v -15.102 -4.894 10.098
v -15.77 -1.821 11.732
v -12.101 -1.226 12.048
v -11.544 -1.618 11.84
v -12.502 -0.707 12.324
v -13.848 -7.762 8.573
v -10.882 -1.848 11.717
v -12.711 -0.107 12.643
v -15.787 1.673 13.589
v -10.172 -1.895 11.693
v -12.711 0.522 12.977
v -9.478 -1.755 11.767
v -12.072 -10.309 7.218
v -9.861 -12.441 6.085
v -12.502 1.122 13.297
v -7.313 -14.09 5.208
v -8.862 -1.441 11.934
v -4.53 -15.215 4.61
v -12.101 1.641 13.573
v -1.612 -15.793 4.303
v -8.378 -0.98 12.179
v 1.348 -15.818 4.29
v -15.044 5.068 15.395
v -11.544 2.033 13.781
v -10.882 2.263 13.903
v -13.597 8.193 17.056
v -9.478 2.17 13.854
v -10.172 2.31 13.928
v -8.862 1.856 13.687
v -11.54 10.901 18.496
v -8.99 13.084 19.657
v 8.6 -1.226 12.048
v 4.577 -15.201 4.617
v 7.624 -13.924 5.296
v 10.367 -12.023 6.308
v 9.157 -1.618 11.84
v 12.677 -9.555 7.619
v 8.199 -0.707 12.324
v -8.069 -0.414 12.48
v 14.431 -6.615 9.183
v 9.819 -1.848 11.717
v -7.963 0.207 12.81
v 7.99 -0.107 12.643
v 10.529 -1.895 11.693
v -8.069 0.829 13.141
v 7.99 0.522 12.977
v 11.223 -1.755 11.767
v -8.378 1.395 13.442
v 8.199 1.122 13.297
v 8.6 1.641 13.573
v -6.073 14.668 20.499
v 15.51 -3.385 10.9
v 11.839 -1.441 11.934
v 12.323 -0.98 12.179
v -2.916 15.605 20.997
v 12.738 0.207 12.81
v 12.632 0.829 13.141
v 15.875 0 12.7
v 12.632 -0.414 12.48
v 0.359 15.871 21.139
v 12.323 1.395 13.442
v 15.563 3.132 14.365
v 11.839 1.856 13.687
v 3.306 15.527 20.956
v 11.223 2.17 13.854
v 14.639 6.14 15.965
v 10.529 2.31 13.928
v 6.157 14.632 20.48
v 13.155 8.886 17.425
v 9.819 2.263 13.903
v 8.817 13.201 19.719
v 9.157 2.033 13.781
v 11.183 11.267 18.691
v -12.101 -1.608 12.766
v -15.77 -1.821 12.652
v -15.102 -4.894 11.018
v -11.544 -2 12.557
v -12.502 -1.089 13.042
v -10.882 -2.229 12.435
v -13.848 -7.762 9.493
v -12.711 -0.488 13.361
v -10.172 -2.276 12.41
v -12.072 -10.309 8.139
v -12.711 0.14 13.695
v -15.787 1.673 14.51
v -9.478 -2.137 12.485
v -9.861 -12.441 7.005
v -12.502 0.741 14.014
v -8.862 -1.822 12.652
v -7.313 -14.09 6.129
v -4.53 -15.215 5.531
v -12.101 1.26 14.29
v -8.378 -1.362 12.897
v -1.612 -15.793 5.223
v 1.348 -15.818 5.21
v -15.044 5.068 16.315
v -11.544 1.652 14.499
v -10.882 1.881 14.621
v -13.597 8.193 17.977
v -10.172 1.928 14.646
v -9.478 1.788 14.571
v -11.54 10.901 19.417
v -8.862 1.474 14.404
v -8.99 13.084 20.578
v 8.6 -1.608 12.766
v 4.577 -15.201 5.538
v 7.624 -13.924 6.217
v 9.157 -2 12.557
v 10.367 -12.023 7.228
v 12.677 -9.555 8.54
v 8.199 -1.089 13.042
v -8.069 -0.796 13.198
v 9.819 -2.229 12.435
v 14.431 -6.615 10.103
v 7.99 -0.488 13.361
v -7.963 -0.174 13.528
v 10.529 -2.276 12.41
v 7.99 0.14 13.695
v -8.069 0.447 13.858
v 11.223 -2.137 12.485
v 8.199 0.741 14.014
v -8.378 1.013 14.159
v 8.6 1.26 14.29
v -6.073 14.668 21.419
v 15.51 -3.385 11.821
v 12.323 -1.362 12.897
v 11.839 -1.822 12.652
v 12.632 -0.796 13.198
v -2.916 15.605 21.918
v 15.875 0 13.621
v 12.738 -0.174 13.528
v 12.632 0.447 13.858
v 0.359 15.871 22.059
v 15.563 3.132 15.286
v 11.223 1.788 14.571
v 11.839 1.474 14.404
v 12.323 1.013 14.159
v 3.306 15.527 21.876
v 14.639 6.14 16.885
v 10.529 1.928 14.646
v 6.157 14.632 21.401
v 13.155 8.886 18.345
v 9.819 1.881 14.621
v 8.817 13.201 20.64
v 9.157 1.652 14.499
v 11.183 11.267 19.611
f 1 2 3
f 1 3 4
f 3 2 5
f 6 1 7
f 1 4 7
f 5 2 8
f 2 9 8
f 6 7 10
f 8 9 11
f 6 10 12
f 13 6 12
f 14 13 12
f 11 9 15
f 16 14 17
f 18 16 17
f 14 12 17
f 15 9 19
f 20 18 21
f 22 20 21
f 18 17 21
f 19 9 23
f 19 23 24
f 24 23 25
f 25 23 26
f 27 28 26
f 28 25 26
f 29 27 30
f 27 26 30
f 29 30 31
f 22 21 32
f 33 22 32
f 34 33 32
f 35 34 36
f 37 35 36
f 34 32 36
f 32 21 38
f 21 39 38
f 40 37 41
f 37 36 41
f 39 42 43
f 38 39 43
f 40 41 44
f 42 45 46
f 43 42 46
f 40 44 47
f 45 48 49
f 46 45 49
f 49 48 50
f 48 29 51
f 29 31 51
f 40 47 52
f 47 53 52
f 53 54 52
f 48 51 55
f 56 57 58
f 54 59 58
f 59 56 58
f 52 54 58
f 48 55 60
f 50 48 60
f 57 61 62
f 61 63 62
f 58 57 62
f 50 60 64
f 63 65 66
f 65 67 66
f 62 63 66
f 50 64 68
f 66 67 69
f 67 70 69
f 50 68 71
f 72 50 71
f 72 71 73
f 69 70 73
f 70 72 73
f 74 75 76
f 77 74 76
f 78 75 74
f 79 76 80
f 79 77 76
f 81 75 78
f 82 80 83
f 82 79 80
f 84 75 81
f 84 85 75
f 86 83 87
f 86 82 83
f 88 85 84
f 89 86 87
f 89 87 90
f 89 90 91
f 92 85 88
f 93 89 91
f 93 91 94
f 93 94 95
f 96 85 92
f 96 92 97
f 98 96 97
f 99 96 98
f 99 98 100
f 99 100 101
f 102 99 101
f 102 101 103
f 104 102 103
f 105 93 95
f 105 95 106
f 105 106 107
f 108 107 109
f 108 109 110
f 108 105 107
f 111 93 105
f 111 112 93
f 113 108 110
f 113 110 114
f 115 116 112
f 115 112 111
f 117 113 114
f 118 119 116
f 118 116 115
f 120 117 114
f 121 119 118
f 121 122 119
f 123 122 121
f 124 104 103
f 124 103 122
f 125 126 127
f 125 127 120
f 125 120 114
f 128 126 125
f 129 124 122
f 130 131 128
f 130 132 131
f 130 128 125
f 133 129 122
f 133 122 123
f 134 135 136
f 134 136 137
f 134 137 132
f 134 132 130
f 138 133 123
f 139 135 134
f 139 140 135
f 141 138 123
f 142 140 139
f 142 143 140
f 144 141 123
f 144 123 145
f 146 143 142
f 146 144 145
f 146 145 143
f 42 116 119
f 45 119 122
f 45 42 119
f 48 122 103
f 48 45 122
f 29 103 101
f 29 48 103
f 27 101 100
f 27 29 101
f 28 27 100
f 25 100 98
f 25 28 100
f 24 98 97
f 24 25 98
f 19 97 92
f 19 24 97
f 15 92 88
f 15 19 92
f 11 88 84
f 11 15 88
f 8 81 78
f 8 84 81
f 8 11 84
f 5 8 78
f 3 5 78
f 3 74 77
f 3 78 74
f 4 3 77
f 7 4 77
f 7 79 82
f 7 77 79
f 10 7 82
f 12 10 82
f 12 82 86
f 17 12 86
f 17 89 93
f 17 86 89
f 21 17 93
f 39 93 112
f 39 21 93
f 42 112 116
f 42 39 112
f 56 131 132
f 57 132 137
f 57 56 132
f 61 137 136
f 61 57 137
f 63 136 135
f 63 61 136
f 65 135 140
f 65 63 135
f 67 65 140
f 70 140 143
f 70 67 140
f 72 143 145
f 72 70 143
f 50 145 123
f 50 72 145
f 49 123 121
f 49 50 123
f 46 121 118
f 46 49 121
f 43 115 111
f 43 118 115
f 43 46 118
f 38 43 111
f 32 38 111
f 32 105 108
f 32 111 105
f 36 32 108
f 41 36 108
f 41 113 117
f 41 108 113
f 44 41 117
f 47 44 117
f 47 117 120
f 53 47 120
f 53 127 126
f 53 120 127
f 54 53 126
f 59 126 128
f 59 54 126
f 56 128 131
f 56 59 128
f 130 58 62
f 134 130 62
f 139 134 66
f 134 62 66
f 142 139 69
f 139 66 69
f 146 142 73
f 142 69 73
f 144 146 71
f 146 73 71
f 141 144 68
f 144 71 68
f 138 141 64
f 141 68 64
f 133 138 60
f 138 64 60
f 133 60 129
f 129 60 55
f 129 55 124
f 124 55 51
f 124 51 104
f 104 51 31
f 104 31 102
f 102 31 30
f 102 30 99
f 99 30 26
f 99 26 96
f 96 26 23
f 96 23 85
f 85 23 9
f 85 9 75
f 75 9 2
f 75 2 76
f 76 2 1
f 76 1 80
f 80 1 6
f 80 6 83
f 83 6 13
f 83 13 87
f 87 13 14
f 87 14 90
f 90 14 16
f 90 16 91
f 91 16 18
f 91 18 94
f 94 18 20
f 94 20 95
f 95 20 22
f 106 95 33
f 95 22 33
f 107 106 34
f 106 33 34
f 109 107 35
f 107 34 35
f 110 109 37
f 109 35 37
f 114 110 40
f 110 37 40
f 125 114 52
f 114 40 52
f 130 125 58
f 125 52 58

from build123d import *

# Parameters (mm, degrees)
F0_R      = 15.875
F1_DEPTH  = 25.4
F5_R      = 28.0073181772
F6_DEPTH  = 25.4
F7_R      = 26.7212354085
F8_DEPTH  = 25.4
F9_R      = 2.3876
F10_DEPTH = 25.4


with BuildPart() as f1:
    # F0 (on Top) → F1 (new body)
    with BuildSketch(Plane.XY):
        Circle(F0_R)
    extrude(amount=F1_DEPTH)

    # F5 (on offset) → F6 (cut)
    with BuildSketch(Plane(origin=(0, -5.645975072, 10.6185347405), x_dir=(1, 0, 0), z_dir=(0, -0.4694715628, 0.8829475929))):
        Circle(F5_R)
    extrude(amount=F6_DEPTH, mode=Mode.SUBTRACT)

    # F7 (on line) → F8 (cut)
    with BuildSketch(Plane(origin=(0, -5.2643885857, 9.900874937), x_dir=(1, 0, 0), z_dir=(0, -0.4694715628, 0.8829475929))):
        with Locations((-3.1001365278, 4.3183793314)):
            Circle(F7_R)
    extrude(amount=-F8_DEPTH, mode=Mode.SUBTRACT)

    # F9 (on line) → F10 (cut)
    with BuildSketch(Plane(origin=(0, -5.2643885857, 9.900874937), x_dir=(1, 0, 0), z_dir=(0, -0.4694715628, 0.8829475929))):
        with Locations((-10.3505, 6.1972388474)):
            Circle(F9_R)
        with Locations((10.3505, 6.1972388474)):
            Circle(F9_R)
    extrude(amount=F10_DEPTH, mode=Mode.SUBTRACT)


solid = f1.part
